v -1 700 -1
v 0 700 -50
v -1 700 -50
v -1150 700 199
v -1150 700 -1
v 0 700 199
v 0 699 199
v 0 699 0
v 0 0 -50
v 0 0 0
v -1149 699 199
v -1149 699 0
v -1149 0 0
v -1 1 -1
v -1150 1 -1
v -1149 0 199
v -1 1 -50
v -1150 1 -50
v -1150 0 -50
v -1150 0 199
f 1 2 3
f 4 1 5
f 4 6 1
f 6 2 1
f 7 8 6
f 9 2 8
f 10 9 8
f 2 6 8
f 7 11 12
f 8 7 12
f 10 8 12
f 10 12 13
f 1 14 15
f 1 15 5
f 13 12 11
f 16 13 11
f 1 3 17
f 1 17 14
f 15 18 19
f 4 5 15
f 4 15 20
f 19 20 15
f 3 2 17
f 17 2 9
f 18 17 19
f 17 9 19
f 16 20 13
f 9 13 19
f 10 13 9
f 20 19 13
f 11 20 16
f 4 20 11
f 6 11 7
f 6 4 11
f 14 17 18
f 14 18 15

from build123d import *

# Parameters (mm, degrees)
F1_DEPTH = 1150
F2_W     = 1
F2_H     = 49
F3_DEPTH = 699
F4_W     = 1
F4_H     = 199
F5_DEPTH = 699


with BuildPart() as f1:
    # F0 (on Right) → F1 (new body)
    with BuildSketch(Plane.YZ):
        Polygon((699, 0), (0, 0), (0, -50), (1, -50), (1, -1), (700, -1), (700, 199), (699, 199), align=None)
    extrude(amount=-F1_DEPTH)

    # F2 (on face) → F3 (join, through all)
    with BuildSketch(Plane(origin=(0, 1, 0), x_dir=(-1, 0, 0), z_dir=(0, 1, 0))):
        with Locations((0.5, -25.5)):
            Rectangle(F2_W, F2_H)
    extrude(amount=F3_DEPTH)

    # F4 (on face) → F5 (join)
    with BuildSketch(Plane.XZ.offset(-699)):
        with Locations((-1149.5, 99.5)):
            Rectangle(F4_W, F4_H)
    extrude(amount=F5_DEPTH)


solid = f1.part
